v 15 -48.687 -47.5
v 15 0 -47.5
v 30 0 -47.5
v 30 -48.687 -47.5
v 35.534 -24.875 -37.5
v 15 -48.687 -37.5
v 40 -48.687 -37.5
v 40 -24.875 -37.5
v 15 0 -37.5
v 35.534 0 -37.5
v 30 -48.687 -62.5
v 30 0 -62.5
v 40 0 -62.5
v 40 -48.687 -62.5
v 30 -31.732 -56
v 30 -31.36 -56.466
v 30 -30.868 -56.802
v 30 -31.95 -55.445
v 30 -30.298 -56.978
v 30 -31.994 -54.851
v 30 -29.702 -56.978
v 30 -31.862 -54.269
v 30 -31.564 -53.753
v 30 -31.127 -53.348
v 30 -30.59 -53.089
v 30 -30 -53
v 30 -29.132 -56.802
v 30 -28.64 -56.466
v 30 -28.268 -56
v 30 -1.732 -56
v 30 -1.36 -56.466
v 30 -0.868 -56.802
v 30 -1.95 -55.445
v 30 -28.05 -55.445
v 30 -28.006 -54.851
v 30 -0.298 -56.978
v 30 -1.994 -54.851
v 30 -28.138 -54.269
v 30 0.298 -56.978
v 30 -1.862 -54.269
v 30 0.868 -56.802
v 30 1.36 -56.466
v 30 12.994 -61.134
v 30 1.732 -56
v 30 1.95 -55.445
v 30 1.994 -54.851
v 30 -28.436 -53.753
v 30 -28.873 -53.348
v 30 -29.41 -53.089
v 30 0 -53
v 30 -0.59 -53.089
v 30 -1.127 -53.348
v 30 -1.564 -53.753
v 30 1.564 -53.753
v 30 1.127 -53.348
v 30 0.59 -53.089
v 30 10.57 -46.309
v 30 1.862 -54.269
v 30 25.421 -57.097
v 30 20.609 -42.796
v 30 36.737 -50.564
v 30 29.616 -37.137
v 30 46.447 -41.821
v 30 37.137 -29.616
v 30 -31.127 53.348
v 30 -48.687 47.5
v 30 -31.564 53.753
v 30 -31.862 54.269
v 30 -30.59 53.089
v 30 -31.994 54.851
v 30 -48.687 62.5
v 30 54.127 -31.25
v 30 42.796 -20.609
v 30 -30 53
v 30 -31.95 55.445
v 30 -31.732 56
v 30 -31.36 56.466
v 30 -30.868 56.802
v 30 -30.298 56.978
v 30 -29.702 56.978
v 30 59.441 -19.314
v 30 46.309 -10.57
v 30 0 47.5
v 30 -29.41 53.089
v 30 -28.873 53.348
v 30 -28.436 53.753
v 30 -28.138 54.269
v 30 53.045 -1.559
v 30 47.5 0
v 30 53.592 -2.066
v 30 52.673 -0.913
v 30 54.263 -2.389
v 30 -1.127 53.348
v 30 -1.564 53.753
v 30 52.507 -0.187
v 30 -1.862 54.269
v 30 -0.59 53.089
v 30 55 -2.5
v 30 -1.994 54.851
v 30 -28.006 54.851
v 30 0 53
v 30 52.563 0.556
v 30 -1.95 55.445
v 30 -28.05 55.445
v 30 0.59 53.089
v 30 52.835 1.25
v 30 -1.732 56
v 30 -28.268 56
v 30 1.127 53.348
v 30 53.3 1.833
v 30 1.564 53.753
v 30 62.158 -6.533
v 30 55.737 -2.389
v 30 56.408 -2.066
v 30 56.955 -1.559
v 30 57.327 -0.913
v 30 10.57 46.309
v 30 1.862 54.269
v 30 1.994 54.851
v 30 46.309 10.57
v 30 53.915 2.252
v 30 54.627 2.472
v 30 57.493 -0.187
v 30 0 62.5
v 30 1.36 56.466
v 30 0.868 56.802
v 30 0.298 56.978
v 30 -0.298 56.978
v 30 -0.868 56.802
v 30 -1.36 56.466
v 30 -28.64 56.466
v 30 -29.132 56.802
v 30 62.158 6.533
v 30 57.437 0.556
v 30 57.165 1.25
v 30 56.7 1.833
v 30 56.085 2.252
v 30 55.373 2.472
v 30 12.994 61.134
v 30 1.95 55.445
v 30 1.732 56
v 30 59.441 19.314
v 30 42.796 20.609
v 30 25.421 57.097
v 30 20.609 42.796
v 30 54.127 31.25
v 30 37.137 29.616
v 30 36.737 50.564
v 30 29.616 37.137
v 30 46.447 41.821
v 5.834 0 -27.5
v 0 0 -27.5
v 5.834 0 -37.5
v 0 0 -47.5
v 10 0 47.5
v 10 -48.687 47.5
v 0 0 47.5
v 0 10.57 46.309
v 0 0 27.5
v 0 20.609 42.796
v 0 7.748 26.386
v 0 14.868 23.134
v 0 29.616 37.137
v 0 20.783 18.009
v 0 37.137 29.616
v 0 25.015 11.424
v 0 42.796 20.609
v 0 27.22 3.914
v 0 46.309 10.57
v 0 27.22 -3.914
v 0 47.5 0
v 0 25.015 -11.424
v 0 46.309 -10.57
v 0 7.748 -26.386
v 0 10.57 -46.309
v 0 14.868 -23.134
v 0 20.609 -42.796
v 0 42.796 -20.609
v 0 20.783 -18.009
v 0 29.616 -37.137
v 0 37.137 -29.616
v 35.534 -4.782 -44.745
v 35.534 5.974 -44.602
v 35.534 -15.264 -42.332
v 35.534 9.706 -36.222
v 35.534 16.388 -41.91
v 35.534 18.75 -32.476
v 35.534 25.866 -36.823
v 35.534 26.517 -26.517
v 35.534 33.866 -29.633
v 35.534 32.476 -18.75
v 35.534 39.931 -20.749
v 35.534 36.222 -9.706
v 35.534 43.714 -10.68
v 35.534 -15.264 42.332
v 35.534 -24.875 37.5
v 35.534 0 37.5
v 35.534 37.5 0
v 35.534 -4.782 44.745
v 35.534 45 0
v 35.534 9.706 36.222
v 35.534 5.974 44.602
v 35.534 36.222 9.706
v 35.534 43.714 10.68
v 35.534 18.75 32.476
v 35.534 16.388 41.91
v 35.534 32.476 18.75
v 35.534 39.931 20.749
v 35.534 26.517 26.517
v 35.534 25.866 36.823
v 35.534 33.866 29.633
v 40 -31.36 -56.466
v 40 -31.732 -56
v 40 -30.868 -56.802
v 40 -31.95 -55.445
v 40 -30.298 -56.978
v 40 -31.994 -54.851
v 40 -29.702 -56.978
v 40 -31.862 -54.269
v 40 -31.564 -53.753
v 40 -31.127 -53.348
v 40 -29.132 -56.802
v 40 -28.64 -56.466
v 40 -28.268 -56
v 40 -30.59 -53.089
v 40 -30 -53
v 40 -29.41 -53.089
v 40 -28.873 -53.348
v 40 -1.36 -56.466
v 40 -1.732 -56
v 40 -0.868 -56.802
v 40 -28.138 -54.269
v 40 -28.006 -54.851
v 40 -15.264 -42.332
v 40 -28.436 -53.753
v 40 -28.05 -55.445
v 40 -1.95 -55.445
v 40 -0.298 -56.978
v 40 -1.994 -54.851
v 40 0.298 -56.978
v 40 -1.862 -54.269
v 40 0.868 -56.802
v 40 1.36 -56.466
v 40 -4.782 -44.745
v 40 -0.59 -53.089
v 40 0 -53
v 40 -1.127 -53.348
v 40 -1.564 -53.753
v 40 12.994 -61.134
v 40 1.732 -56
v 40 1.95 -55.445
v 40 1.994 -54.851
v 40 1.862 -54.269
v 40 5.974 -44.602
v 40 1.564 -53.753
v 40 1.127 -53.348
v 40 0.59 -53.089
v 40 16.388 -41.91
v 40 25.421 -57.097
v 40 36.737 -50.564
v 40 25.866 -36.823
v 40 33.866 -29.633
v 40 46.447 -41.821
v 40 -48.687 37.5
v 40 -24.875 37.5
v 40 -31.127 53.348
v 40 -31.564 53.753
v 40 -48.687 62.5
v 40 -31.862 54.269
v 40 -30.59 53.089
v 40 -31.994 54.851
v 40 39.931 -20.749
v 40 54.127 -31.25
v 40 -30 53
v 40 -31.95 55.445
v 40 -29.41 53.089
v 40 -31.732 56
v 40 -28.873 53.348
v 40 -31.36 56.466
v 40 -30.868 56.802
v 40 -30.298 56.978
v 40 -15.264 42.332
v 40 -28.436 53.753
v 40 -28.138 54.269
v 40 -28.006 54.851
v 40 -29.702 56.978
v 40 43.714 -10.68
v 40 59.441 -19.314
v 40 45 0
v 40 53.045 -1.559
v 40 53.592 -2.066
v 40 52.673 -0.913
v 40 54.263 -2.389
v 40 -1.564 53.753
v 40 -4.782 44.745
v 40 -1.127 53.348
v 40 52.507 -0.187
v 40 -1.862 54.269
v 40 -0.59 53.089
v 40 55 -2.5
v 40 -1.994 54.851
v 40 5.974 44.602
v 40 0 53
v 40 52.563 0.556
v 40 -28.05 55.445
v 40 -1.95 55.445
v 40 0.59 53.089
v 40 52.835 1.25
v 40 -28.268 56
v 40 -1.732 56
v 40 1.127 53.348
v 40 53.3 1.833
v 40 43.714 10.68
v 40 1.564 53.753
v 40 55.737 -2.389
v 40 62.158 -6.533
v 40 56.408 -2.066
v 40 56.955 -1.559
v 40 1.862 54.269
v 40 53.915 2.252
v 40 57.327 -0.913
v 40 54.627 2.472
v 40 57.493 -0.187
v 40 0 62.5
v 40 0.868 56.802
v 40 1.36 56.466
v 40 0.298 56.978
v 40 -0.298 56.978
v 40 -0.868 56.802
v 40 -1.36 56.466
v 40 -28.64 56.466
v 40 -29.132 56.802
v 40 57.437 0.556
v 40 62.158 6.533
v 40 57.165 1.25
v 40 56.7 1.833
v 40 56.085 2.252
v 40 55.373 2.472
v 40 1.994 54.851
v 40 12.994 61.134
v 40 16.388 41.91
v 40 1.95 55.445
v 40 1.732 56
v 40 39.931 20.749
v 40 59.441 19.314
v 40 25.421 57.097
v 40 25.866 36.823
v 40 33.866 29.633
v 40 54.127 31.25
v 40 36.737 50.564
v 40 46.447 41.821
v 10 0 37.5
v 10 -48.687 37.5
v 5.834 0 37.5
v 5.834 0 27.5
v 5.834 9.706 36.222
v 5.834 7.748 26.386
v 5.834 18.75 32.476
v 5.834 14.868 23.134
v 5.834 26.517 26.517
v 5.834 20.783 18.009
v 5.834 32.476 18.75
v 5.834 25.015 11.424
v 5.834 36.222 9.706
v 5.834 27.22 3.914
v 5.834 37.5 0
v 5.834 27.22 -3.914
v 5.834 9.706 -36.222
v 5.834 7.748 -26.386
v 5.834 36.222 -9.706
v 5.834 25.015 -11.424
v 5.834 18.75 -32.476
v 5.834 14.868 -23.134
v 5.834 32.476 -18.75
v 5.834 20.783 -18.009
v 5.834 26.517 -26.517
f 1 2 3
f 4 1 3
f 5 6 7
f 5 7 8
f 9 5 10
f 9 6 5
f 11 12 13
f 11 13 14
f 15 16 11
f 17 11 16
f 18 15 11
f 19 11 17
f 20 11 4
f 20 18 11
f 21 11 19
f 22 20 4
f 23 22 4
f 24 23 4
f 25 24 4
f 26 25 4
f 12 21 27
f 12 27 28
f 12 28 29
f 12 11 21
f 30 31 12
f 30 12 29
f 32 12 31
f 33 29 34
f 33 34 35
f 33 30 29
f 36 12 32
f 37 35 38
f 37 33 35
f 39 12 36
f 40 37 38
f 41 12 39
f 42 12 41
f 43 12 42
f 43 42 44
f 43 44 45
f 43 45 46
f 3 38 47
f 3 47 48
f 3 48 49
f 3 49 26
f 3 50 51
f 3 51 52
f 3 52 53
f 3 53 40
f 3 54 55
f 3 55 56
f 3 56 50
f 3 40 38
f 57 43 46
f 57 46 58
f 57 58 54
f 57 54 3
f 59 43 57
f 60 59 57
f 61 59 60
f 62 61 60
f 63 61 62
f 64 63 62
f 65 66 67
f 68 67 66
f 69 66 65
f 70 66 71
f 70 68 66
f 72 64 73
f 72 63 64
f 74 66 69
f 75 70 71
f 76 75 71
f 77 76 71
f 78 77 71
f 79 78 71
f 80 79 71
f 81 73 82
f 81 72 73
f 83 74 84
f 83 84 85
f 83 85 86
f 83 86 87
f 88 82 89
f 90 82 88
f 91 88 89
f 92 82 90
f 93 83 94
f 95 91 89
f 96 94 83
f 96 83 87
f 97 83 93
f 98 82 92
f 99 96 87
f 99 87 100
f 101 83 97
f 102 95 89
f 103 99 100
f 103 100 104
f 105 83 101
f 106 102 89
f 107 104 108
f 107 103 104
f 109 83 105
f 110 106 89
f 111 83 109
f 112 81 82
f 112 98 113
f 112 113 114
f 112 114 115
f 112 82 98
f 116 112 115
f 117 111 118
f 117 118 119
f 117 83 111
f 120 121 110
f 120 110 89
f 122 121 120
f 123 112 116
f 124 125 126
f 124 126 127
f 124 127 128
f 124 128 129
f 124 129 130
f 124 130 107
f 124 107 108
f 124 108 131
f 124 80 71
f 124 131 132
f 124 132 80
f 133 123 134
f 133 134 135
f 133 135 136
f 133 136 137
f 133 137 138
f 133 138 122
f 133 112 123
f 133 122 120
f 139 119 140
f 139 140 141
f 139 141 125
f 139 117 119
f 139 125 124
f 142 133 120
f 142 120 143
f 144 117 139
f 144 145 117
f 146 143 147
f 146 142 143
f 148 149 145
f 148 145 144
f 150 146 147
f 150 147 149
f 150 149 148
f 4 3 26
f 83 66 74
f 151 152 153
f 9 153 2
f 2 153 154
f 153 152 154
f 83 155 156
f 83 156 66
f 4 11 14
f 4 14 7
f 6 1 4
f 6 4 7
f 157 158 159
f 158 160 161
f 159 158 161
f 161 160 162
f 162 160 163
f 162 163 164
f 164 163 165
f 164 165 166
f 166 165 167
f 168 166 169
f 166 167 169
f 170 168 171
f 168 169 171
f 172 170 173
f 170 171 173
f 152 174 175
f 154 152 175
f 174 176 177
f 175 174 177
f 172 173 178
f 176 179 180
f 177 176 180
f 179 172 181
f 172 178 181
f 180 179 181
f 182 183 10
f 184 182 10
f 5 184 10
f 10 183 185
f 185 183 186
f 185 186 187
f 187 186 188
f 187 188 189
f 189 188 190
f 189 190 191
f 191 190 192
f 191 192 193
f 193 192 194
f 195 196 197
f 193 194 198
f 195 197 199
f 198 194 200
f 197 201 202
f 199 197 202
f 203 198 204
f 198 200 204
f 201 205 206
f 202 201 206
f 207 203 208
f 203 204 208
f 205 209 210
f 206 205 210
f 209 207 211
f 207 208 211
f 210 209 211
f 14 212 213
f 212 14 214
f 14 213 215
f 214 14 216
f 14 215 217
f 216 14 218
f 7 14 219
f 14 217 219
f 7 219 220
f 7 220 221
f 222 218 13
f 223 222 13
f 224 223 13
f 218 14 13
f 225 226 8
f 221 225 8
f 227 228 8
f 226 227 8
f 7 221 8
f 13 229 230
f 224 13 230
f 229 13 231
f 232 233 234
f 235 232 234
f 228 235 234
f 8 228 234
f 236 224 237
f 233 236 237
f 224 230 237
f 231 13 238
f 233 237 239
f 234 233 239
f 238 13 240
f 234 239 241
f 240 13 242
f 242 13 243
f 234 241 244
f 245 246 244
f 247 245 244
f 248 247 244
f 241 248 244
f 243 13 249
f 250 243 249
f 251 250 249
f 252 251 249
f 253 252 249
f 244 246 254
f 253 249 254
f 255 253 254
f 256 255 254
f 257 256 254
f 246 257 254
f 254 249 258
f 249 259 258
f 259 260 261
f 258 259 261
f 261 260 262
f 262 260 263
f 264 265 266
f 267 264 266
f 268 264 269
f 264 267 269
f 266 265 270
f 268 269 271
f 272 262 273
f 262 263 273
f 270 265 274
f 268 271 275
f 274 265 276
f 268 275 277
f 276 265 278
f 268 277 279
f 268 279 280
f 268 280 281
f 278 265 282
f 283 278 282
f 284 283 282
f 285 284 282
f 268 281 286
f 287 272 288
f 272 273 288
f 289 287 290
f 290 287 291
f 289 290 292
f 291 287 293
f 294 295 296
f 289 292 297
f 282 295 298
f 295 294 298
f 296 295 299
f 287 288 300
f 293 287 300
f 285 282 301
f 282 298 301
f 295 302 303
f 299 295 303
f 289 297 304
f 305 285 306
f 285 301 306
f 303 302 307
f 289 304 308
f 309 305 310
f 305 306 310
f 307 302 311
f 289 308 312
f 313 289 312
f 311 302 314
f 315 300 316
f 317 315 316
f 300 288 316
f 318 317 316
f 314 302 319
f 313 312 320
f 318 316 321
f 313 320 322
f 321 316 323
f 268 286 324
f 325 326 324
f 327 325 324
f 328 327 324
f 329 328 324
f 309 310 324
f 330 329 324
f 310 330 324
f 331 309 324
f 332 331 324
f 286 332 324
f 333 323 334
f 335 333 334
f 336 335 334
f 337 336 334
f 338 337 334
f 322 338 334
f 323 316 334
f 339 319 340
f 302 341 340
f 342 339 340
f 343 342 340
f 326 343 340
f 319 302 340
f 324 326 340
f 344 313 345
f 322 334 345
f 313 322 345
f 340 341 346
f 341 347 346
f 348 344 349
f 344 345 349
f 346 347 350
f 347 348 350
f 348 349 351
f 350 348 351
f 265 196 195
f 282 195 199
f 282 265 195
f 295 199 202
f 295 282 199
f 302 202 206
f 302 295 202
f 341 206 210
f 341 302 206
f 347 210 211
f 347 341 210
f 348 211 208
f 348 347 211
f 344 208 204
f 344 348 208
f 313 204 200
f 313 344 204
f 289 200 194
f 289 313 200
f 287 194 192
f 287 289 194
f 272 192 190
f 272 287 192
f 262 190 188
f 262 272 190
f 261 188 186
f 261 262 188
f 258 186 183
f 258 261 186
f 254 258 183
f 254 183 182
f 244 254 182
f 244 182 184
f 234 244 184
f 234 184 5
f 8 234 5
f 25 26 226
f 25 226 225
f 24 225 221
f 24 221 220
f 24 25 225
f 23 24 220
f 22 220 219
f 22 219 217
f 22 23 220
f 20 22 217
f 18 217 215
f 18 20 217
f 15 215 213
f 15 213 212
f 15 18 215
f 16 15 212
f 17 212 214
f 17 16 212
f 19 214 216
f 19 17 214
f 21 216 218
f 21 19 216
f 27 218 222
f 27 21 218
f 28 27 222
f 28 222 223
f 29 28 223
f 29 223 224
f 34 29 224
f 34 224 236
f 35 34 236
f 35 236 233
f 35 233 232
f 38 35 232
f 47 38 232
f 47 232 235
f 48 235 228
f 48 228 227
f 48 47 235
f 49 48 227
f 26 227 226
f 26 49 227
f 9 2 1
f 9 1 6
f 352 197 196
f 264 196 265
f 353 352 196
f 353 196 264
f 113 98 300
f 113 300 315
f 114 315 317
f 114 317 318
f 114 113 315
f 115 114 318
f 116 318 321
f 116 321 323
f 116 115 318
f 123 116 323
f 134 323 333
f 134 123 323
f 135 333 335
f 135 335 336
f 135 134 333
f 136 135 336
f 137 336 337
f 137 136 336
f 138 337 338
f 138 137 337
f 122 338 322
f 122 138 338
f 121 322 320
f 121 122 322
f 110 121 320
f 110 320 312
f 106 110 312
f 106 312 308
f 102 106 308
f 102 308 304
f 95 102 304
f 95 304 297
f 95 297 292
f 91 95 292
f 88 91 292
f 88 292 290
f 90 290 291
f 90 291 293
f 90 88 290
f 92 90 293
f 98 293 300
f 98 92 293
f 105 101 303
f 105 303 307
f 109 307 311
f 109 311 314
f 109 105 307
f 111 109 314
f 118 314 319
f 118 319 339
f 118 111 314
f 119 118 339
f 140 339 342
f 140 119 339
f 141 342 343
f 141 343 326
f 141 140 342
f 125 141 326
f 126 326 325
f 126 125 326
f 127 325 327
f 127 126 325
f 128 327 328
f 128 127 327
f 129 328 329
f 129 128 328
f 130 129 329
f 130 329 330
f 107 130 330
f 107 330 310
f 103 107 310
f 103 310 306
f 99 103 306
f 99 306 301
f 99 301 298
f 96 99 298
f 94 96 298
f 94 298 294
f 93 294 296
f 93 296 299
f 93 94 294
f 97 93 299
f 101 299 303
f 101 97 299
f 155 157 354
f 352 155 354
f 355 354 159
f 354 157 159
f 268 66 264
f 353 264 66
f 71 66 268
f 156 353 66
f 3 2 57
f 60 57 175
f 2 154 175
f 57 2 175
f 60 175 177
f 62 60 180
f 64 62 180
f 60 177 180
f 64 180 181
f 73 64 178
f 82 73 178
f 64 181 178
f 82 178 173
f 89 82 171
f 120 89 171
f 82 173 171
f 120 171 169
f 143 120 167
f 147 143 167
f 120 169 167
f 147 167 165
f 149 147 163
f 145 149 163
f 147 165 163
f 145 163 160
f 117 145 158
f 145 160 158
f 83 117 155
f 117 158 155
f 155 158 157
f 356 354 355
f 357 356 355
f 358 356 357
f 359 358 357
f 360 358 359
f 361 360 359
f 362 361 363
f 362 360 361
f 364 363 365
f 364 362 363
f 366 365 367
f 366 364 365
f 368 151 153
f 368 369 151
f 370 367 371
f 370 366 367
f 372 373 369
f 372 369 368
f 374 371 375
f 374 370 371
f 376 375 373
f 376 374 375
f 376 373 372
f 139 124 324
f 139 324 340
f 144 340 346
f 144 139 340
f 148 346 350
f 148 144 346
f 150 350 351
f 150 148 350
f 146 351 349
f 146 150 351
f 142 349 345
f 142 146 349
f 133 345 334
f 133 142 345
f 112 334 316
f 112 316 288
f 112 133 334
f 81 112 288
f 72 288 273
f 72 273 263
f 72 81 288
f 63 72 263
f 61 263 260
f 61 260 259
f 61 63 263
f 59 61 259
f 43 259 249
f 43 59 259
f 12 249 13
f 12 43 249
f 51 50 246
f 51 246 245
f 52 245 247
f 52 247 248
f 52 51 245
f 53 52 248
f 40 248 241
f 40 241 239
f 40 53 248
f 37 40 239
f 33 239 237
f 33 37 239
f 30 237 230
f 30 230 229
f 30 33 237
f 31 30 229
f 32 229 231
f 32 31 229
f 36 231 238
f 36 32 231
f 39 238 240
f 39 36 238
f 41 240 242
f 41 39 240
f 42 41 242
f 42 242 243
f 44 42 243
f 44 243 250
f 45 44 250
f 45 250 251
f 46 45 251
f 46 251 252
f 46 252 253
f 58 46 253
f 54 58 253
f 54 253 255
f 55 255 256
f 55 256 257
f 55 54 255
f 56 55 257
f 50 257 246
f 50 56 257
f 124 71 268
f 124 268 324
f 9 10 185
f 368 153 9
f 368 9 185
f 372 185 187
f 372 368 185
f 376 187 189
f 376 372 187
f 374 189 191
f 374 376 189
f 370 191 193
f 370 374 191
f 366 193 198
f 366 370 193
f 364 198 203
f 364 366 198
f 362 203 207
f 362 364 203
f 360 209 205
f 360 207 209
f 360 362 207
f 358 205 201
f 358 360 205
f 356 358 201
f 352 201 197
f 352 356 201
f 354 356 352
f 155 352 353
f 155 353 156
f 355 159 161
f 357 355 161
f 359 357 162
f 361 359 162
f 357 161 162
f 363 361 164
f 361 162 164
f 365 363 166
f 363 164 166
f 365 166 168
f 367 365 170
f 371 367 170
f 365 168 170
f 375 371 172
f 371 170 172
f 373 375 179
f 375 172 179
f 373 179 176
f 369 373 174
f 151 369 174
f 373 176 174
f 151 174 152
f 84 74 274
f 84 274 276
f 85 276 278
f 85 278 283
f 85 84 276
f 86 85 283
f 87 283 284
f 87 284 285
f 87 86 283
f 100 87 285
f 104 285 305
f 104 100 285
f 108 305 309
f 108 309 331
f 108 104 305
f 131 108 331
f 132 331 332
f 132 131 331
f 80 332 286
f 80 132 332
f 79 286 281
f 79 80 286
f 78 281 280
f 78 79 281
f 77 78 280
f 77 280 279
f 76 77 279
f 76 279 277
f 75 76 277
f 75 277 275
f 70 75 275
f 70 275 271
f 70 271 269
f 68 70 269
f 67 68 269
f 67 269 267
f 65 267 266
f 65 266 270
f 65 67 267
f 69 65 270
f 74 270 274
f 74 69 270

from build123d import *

# Parameters (mm, degrees)
BOSS_EXTRUDE1_DEPTH = 10
BOSS_EXTRUDE2_DEPTH = 20
SKETCH3_W           = 20
SKETCH3_H           = 10
SKETCH3_W_2         = 15
BOSS_EXTRUDE3_DEPTH = 48.687175822
SKETCH4_R           = 2
SKETCH4_R_2         = 2.5
BOSS_EXTRUDE4_DEPTH = 10
CUT_EXTRUDE1_START  = -4.165511
CUT_EXTRUDE1_DEPTH  = 4.165511
SKETCH8_R           = 45
SKETCH8_R_2         = 36
CUT_EXTRUDE2_DEPTH  = 4.465511


with BuildPart() as part:
    # Sketch1 → Boss-Extrude1 (new body)
    with BuildSketch(Plane(origin=(0, 0, 0), x_dir=(0, 0, -1), z_dir=(1, 0, 0))):
        with BuildLine():
            Line((-47.5, 0), (-27.5, 0))
            ThreePointArc((-27.5, 0), (0, 27.5), (27.5, 0))
            Line((27.5, 0), (47.5, 0))
            ThreePointArc((47.5, 0), (0, 47.5), (-47.5, 0))
        make_face()
    extrude(amount=BOSS_EXTRUDE1_DEPTH)

    # Sketch2 → Boss-Extrude2 (add)
    with BuildSketch(Plane(origin=(10, 0, 0), x_dir=(0, 0, -1), z_dir=(1, 0, 0))):
        with BuildLine():
            Line((-47.5, 0), (-37.5, 0))
            ThreePointArc((-37.5, 0), (0, 37.5), (37.5, 0))
            Line((37.5, 0), (47.5, 0))
            ThreePointArc((47.5, 0), (0, 47.5), (-47.5, 0))
        make_face()
    extrude(amount=BOSS_EXTRUDE2_DEPTH)

    # Sketch3 → Boss-Extrude3 (add)
    with BuildSketch(Plane.XZ):
        with Locations((20, 42.5)):
            Rectangle(SKETCH3_W, SKETCH3_H)
        with Locations((22.5, -42.5)):
            Rectangle(SKETCH3_W_2, SKETCH3_H)
    extrude(amount=BOSS_EXTRUDE3_DEPTH)

    # Sketch4 → Boss-Extrude4 (add)
    with BuildSketch(Plane(origin=(30, 0, 0), x_dir=(0, 0, -1), z_dir=(1, 0, 0))):
        with BuildLine():
            Line((62.5, -48.687175822), (37.5, -48.687175822))
            Line((37.5, -48.687175822), (37.5, 0))
            ThreePointArc((37.5, 0), (0, 37.5), (-37.5, 0))
            Line((-37.5, 0), (-37.5, -48.687175822))
            Line((-37.5, -48.687175822), (-62.5, -48.687175822))
            Line((-62.5, -48.687175822), (-62.5, 0))
            ThreePointArc((-62.5, 0), (0, 62.5), (62.5, 0))
            Line((62.5, 0), (62.5, -48.687175822))
        make_face()
        with Locations((-55, 0)):
            Circle(SKETCH4_R, mode=Mode.SUBTRACT)
        with Locations((0, 55)):
            Circle(SKETCH4_R_2, mode=Mode.SUBTRACT)
        with Locations((-55, -30)):
            Circle(SKETCH4_R, mode=Mode.SUBTRACT)
        with Locations(Location((55, -30, 0), (0, 0, 180))):
            Circle(SKETCH4_R, mode=Mode.SUBTRACT)
        with Locations(Location((55, 0, 0), (0, 0, 180))):
            Circle(SKETCH4_R, mode=Mode.SUBTRACT)
    extrude(amount=BOSS_EXTRUDE4_DEPTH)

    # Sketch7 → Cut-Extrude1 (cut)
    with BuildSketch(Plane(origin=(10, 0, 0), x_dir=(0, 0, -1), z_dir=(1, 0, 0)).offset(CUT_EXTRUDE1_START)):
        with BuildLine():
            Line((27.5, 0), (37.5, 0))
            ThreePointArc((37.5, 0), (0, 37.5), (-37.5, 0))
            Line((-37.5, 0), (-27.5, 0))
            ThreePointArc((-27.5, 0), (0, 27.5), (27.5, 0))
        make_face()
    extrude(amount=CUT_EXTRUDE1_DEPTH, mode=Mode.SUBTRACT)

    # Sketch8 → Cut-Extrude2 (cut)
    with BuildSketch(Plane.ZY.offset(-40)):
        Circle(SKETCH8_R)
        Circle(SKETCH8_R_2, mode=Mode.SUBTRACT)
    extrude(amount=CUT_EXTRUDE2_DEPTH, mode=Mode.SUBTRACT)


solid = part.part
